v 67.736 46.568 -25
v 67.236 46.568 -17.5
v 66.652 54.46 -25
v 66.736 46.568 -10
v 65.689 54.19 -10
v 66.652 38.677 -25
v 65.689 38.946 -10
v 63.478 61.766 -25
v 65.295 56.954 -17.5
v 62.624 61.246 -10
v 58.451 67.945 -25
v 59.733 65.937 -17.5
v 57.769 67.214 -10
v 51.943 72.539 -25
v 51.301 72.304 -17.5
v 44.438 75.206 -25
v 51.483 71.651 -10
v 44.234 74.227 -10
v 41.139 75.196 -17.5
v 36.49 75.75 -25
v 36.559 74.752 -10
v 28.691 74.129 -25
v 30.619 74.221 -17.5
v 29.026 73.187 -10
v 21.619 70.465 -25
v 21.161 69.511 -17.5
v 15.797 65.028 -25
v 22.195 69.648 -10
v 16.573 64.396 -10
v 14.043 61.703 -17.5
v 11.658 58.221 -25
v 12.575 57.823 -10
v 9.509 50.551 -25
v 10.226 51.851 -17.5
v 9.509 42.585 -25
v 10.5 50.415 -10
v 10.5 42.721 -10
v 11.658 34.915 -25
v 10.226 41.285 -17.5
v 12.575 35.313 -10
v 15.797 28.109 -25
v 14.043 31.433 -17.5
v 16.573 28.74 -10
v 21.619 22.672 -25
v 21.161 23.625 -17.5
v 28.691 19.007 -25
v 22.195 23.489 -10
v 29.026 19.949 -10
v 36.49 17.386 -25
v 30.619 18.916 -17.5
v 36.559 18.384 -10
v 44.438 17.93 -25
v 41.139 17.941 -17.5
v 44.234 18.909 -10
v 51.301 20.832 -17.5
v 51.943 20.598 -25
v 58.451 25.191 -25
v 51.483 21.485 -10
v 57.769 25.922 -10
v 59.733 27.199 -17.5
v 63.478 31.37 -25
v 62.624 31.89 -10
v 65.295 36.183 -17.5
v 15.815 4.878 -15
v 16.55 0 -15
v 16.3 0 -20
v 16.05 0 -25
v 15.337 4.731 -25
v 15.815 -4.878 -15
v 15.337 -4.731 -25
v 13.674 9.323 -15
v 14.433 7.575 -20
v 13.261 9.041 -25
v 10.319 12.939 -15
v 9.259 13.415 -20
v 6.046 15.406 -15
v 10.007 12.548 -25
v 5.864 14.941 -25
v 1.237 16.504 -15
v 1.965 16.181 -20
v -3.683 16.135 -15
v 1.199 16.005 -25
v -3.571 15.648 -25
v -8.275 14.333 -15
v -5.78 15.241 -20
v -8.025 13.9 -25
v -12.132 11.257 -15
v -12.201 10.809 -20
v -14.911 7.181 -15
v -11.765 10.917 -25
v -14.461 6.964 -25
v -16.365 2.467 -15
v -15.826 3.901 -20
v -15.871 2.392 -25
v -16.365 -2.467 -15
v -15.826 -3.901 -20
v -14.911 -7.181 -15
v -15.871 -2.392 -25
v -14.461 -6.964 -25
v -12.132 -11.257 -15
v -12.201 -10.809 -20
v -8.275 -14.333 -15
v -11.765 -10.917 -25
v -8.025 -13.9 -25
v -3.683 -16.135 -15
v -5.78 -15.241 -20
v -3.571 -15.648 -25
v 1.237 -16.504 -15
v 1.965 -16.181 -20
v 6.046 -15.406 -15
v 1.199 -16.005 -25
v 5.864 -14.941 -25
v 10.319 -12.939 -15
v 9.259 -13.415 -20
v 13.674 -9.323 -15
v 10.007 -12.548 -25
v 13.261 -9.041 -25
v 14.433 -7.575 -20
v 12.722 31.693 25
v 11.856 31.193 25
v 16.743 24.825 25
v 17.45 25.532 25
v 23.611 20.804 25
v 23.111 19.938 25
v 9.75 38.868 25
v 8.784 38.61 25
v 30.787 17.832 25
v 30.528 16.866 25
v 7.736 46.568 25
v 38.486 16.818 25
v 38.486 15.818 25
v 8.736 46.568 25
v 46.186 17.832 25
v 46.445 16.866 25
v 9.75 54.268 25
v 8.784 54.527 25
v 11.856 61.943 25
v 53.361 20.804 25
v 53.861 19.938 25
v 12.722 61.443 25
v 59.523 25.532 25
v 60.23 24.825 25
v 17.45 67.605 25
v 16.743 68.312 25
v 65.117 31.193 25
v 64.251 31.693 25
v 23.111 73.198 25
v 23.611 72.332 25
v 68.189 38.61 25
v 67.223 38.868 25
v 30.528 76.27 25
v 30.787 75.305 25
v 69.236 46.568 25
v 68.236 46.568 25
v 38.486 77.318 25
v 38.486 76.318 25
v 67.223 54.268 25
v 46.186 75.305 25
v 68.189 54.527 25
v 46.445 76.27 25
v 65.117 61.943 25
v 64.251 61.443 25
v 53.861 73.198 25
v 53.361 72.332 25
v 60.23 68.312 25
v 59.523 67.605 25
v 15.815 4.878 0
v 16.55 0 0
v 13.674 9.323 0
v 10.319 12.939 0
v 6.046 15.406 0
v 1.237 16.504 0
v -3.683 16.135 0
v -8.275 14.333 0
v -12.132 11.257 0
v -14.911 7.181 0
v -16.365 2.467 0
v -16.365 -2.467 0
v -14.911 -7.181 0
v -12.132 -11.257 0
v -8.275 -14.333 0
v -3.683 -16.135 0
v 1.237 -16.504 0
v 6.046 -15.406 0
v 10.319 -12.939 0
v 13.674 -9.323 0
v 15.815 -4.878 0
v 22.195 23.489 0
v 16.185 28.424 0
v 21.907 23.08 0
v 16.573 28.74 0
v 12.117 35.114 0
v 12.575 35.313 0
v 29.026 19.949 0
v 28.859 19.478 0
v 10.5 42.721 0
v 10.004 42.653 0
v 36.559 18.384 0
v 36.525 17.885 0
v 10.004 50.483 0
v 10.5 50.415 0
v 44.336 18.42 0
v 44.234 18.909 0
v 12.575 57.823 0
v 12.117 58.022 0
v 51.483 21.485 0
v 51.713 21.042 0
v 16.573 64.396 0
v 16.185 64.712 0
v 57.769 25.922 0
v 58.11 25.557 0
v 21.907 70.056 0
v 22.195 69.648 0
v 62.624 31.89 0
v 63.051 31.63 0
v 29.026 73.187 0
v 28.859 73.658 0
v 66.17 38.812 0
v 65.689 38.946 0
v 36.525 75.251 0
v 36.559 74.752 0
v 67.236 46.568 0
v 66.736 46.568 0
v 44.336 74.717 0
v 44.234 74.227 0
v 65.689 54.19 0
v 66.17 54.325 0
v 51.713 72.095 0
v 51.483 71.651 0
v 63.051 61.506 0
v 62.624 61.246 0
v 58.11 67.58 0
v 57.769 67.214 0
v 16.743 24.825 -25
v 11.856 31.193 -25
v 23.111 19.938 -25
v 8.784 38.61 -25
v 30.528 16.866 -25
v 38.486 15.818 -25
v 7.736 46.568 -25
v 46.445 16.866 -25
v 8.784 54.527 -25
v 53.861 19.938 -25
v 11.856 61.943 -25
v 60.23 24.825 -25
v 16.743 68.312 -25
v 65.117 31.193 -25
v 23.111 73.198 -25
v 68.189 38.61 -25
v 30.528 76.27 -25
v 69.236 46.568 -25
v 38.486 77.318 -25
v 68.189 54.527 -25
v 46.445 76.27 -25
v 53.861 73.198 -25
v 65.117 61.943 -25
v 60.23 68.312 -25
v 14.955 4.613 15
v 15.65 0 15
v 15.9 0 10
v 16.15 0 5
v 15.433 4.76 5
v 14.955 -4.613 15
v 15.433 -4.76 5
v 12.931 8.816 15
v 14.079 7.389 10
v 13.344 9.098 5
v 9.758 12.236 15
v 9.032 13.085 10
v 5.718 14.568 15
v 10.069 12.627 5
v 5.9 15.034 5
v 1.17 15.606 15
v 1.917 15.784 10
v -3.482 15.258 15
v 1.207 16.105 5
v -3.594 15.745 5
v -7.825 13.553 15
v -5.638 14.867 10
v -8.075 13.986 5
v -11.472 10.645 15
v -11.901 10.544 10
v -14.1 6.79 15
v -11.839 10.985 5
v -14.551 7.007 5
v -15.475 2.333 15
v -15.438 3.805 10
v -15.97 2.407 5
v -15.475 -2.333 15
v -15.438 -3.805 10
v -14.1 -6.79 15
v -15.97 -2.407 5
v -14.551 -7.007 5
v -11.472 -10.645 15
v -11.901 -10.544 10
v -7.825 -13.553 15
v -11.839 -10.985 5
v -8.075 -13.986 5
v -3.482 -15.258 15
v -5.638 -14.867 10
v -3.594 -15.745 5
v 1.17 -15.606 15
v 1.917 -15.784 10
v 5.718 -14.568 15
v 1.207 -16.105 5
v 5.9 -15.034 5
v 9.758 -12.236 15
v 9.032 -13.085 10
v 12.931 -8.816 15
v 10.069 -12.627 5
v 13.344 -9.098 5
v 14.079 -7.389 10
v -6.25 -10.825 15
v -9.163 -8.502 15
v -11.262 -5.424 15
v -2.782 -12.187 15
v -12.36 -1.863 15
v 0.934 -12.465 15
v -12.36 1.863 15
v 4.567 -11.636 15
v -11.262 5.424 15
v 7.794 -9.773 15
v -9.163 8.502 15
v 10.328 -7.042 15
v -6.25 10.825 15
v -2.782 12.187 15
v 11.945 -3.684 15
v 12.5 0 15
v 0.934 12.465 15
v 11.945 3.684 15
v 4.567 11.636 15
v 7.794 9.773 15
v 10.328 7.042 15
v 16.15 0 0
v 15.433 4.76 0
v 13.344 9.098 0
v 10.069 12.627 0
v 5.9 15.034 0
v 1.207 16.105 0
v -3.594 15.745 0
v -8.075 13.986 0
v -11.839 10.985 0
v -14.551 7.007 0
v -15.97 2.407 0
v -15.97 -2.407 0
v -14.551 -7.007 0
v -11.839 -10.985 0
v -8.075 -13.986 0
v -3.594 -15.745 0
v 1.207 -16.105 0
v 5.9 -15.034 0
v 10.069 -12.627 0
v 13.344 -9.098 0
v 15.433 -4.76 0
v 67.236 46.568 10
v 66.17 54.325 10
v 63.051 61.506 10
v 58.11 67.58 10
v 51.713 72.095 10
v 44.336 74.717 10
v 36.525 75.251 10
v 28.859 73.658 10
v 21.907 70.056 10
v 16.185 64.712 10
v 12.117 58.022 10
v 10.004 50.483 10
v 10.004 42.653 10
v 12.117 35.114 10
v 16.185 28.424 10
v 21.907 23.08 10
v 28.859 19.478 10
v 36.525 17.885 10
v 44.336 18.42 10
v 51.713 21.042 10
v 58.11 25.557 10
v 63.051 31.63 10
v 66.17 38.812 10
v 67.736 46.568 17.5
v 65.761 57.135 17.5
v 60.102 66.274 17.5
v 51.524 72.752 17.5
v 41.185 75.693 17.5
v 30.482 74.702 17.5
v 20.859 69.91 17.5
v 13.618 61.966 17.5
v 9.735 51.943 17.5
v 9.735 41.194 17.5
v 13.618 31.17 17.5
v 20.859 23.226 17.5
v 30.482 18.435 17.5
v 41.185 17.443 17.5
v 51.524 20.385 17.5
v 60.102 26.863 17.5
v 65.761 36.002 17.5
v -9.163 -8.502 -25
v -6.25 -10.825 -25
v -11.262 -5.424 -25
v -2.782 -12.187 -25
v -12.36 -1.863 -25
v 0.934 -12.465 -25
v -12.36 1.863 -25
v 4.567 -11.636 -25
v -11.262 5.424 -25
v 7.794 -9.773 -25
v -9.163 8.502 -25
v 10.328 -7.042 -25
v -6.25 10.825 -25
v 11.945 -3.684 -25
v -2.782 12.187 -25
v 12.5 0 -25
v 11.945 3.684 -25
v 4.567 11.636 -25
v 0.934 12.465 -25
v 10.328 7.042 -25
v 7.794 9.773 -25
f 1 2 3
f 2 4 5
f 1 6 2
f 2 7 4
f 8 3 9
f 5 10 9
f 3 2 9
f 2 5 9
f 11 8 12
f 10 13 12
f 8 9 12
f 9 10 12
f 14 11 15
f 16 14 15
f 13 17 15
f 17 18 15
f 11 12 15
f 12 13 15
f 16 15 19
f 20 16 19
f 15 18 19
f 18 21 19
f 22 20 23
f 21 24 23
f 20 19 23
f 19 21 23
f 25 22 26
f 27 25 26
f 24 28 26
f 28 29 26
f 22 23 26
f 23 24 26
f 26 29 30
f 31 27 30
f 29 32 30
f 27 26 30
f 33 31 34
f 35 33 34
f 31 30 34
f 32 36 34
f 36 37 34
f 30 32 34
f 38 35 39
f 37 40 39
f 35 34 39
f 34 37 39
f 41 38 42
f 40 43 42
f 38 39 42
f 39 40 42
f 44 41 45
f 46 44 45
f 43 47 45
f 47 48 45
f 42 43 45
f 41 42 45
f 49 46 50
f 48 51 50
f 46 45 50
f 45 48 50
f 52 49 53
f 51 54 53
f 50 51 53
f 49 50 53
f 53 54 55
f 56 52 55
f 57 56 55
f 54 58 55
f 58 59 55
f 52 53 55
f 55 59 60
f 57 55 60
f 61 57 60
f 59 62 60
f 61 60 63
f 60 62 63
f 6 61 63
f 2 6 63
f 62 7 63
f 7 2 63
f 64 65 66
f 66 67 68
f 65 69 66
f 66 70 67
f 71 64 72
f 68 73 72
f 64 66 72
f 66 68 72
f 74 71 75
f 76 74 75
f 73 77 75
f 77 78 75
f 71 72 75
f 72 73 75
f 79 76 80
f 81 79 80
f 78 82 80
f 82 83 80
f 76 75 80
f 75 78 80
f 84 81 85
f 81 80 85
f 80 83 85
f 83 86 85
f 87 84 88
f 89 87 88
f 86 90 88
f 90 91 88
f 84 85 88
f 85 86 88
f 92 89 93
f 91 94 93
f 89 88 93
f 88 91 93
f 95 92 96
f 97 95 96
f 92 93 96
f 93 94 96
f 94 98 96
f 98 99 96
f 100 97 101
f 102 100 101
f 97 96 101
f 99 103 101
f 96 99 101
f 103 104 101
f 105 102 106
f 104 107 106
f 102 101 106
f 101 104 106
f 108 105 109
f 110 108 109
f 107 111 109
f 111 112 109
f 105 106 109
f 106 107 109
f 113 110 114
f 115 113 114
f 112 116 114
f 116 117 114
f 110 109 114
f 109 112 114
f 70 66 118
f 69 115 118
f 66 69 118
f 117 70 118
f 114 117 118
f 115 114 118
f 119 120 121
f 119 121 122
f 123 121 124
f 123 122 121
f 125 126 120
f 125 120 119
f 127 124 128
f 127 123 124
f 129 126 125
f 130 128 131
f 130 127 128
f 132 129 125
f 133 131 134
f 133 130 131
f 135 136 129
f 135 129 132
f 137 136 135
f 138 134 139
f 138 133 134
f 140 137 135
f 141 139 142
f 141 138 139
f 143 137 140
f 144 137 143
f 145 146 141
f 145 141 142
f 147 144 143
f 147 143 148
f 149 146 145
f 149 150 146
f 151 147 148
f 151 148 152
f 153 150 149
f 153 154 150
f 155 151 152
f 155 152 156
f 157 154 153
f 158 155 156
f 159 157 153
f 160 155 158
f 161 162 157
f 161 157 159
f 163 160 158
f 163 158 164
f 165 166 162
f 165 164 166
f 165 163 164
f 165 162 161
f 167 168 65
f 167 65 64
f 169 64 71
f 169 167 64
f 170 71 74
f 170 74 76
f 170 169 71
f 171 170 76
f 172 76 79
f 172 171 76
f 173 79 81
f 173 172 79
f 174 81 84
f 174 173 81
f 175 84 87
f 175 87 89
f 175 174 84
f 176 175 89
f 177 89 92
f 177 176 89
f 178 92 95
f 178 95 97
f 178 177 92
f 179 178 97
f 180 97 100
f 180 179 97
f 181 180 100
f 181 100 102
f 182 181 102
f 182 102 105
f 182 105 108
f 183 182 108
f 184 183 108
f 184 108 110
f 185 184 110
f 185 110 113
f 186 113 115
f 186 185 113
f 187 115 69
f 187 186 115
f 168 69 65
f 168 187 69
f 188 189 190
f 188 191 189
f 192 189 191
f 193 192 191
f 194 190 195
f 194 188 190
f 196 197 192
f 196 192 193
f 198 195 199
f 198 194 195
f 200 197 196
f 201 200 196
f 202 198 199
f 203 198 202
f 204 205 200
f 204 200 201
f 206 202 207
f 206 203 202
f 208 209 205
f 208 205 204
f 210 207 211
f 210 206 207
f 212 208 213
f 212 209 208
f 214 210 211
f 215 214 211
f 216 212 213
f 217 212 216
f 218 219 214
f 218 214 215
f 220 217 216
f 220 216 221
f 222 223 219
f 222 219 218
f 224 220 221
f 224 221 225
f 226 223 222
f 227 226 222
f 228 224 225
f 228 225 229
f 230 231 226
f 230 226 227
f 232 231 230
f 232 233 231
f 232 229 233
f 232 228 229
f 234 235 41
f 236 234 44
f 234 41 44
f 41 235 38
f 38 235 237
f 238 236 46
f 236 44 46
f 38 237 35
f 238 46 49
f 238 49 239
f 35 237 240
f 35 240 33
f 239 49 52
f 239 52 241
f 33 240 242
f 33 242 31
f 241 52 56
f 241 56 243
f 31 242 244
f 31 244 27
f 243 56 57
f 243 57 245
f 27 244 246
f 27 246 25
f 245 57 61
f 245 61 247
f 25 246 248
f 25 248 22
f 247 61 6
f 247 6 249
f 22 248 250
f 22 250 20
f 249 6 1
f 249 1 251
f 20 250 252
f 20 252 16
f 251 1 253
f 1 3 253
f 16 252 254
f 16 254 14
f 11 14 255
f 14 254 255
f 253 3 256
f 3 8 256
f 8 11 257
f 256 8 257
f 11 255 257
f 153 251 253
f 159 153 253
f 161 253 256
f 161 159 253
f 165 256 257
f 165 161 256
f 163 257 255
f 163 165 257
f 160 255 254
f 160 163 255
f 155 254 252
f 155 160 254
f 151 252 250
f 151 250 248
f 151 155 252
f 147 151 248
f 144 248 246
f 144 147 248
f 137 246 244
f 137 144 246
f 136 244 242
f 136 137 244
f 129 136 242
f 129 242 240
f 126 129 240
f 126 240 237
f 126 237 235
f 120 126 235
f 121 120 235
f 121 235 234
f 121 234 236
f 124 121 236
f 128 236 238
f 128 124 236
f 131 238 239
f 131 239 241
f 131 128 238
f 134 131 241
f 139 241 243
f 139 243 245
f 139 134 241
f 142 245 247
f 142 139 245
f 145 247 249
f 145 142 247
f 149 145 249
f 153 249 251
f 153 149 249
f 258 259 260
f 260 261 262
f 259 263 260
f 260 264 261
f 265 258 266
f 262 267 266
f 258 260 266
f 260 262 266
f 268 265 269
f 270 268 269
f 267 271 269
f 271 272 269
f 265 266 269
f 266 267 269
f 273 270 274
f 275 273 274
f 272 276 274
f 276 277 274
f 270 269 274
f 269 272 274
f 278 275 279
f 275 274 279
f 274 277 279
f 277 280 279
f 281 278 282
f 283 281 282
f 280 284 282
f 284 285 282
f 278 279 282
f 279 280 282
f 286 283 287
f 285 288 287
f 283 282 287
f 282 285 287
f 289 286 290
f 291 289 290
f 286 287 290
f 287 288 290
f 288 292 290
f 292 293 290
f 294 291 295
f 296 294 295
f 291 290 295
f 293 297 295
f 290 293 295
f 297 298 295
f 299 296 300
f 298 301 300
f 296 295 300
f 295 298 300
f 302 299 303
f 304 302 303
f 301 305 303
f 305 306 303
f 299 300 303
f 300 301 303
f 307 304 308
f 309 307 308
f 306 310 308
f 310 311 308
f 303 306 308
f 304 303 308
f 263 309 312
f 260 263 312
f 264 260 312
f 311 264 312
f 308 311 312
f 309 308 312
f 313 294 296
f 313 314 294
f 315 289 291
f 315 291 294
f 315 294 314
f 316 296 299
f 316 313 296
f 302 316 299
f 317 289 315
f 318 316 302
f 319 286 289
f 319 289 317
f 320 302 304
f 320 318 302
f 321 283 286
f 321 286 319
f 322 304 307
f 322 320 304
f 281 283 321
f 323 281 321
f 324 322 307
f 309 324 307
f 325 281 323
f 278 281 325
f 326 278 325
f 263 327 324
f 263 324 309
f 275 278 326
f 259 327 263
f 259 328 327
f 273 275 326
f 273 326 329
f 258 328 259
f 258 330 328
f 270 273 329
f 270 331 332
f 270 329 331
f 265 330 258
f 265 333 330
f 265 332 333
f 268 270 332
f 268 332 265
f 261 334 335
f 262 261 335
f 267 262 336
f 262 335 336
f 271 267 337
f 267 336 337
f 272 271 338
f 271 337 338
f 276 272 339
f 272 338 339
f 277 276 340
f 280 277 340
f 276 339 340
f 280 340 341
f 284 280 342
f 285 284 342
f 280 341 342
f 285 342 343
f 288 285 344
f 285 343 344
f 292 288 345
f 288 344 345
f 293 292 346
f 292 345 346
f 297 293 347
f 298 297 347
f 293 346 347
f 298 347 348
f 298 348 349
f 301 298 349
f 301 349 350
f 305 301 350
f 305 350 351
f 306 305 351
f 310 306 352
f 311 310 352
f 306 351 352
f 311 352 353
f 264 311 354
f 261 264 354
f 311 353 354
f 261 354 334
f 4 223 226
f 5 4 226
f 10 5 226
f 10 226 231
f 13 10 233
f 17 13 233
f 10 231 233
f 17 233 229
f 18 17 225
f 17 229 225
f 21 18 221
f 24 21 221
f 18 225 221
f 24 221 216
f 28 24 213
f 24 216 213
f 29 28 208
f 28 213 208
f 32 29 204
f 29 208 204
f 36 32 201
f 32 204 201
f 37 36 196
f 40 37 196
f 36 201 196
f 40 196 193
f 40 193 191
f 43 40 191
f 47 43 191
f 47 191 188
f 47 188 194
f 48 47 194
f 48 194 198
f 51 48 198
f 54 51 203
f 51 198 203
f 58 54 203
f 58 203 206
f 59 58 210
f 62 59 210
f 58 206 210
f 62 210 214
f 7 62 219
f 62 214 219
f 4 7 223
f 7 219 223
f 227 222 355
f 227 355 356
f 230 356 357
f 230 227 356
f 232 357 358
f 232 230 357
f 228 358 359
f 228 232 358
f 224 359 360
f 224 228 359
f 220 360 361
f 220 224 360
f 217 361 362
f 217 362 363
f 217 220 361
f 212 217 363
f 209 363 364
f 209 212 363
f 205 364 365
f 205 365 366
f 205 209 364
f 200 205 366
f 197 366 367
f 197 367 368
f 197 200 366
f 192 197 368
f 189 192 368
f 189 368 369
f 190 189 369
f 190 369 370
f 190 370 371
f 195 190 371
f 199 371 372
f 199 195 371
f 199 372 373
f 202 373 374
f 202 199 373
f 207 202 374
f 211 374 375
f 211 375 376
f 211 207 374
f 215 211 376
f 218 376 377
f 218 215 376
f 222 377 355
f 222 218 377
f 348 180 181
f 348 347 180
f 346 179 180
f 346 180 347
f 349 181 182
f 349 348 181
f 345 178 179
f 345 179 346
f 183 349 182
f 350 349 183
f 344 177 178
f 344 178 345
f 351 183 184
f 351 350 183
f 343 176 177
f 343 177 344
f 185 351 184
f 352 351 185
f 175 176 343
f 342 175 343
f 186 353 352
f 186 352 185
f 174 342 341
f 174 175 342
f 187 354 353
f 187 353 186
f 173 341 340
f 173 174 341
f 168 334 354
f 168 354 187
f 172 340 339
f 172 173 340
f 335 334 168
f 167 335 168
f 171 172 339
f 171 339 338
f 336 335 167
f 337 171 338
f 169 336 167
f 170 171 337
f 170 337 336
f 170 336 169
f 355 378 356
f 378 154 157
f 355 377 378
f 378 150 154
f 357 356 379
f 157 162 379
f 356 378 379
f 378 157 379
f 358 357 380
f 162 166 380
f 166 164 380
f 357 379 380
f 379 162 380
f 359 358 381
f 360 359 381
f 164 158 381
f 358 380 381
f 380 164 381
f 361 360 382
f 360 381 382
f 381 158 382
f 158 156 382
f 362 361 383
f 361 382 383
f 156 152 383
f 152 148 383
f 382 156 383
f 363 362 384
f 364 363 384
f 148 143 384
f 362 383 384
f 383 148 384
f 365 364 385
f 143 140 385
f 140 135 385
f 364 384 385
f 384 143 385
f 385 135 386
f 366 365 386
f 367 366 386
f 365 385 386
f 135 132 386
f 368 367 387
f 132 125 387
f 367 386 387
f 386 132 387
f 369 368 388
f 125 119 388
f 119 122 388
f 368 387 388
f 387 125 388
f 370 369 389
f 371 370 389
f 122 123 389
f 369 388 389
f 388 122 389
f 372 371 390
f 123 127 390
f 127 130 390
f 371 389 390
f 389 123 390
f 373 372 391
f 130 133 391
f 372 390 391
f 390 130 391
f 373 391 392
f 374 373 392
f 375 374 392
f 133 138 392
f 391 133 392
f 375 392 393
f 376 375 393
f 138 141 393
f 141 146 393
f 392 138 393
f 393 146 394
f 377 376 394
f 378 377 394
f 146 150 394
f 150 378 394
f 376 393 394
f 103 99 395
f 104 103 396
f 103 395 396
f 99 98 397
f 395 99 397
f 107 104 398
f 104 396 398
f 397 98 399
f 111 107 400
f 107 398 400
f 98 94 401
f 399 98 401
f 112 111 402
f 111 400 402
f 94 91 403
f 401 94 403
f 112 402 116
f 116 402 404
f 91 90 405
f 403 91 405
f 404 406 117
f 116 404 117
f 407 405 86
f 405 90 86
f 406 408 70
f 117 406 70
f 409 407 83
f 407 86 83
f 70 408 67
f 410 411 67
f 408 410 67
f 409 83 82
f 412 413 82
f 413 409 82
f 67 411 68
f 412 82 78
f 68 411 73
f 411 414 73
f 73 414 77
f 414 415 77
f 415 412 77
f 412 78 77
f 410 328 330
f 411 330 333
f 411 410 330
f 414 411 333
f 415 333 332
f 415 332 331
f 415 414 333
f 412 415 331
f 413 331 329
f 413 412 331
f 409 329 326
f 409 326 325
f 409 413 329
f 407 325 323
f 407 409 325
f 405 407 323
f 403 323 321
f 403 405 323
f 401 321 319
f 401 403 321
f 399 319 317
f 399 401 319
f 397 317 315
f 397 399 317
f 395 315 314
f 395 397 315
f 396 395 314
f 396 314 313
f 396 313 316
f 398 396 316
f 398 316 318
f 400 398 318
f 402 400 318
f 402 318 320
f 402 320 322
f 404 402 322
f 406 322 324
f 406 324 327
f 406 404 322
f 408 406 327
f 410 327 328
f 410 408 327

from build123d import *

# Parameters (mm, degrees)
F0_R     = 16.15
F0_R_2   = 12.5
F1_DEPTH = 15
F0_R_3   = 16.55
F2_DEPTH = 25
F3_SIZE2 = 10
F3_SIZE  = 0.5
F4_SIZE2 = 0.5
F4_SIZE  = 10
F5_R     = 30.75
F5_R_2   = 28.75
F5_R_3   = 28.25
F6_DEPTH = 25
F7_DEPTH = 25
F8_SIZE2 = 1
F8_SIZE  = 15
F9_SIZE2 = 15
F9_SIZE  = 1


with BuildPart() as f1:
    # F0 (on Top) → F1 (new body)
    with BuildSketch(Plane.XY):
        Circle(F0_R)
        Circle(F0_R_2, mode=Mode.SUBTRACT)
    extrude(amount=F1_DEPTH)

    # F0 (on Top) → F2 (join)
    with BuildSketch(Plane.XY):
        Circle(F0_R_3)
        Circle(F0_R, mode=Mode.SUBTRACT)
        Circle(F0_R)
        Circle(F0_R_2, mode=Mode.SUBTRACT)
    extrude(amount=-F2_DEPTH)

    # F3
    f3_edges = [f1.edges().sort_by_distance(p)[0] for p in [
        (-16.15, 0, 15),
    ]]
    f3_side = f1.faces().sort_by_distance((-15.693209, 0, 15))[0]
    chamfer(f3_edges, length=F3_SIZE, length2=F3_SIZE2, reference=f3_side)

    # F4
    f4_edges = [f1.edges().sort_by_distance(p)[0] for p in [
        (-16.55, 0, -25),
    ]]
    f4_side = f1.faces().sort_by_distance((-16.55, 0, -12.5))[0]
    chamfer(f4_edges, length=F4_SIZE, length2=F4_SIZE2, reference=f4_side)


with BuildPart() as f6:
    # F5 (on Top) → F6 (new body)
    with BuildSketch(Plane.XY):
        with Locations((38.4864732623, 46.5682074428)):
            Circle(F5_R)
        with Locations((38.4864732623, 46.5682074428)):
            Circle(F5_R_2, mode=Mode.SUBTRACT)
        with Locations((38.4864732623, 46.5682074428)):
            Circle(F5_R_2)
        with Locations((38.4864732623, 46.5682074428)):
            Circle(F5_R_3, mode=Mode.SUBTRACT)
    extrude(amount=-F6_DEPTH)

    # F5 (on Top) → F7 (join)
    with BuildSketch(Plane.XY):
        with Locations((38.4864732623, 46.5682074428)):
            Circle(F5_R)
        with Locations((38.4864732623, 46.5682074428)):
            Circle(F5_R_2, mode=Mode.SUBTRACT)
    extrude(amount=F7_DEPTH)

    # F8
    f8_edges = [f6.edges().sort_by_distance(p)[0] for p in [
        (9.736473, 46.568207, 25),
    ]]
    f8_side = f6.faces().sort_by_distance((9.736473, 46.568207, 12.5))[0]
    chamfer(f8_edges, length=F8_SIZE, length2=F8_SIZE2, reference=f8_side)

    # F9
    f9_edges = [f6.edges().sort_by_distance(p)[0] for p in [
        (10.236473, 46.568207, -25),
    ]]
    f9_side = f6.faces().sort_by_distance((8.606215, 46.568207, -25))[0]
    chamfer(f9_edges, length=F9_SIZE, length2=F9_SIZE2, reference=f9_side)


solid = Compound([f1.part, f6.part])
